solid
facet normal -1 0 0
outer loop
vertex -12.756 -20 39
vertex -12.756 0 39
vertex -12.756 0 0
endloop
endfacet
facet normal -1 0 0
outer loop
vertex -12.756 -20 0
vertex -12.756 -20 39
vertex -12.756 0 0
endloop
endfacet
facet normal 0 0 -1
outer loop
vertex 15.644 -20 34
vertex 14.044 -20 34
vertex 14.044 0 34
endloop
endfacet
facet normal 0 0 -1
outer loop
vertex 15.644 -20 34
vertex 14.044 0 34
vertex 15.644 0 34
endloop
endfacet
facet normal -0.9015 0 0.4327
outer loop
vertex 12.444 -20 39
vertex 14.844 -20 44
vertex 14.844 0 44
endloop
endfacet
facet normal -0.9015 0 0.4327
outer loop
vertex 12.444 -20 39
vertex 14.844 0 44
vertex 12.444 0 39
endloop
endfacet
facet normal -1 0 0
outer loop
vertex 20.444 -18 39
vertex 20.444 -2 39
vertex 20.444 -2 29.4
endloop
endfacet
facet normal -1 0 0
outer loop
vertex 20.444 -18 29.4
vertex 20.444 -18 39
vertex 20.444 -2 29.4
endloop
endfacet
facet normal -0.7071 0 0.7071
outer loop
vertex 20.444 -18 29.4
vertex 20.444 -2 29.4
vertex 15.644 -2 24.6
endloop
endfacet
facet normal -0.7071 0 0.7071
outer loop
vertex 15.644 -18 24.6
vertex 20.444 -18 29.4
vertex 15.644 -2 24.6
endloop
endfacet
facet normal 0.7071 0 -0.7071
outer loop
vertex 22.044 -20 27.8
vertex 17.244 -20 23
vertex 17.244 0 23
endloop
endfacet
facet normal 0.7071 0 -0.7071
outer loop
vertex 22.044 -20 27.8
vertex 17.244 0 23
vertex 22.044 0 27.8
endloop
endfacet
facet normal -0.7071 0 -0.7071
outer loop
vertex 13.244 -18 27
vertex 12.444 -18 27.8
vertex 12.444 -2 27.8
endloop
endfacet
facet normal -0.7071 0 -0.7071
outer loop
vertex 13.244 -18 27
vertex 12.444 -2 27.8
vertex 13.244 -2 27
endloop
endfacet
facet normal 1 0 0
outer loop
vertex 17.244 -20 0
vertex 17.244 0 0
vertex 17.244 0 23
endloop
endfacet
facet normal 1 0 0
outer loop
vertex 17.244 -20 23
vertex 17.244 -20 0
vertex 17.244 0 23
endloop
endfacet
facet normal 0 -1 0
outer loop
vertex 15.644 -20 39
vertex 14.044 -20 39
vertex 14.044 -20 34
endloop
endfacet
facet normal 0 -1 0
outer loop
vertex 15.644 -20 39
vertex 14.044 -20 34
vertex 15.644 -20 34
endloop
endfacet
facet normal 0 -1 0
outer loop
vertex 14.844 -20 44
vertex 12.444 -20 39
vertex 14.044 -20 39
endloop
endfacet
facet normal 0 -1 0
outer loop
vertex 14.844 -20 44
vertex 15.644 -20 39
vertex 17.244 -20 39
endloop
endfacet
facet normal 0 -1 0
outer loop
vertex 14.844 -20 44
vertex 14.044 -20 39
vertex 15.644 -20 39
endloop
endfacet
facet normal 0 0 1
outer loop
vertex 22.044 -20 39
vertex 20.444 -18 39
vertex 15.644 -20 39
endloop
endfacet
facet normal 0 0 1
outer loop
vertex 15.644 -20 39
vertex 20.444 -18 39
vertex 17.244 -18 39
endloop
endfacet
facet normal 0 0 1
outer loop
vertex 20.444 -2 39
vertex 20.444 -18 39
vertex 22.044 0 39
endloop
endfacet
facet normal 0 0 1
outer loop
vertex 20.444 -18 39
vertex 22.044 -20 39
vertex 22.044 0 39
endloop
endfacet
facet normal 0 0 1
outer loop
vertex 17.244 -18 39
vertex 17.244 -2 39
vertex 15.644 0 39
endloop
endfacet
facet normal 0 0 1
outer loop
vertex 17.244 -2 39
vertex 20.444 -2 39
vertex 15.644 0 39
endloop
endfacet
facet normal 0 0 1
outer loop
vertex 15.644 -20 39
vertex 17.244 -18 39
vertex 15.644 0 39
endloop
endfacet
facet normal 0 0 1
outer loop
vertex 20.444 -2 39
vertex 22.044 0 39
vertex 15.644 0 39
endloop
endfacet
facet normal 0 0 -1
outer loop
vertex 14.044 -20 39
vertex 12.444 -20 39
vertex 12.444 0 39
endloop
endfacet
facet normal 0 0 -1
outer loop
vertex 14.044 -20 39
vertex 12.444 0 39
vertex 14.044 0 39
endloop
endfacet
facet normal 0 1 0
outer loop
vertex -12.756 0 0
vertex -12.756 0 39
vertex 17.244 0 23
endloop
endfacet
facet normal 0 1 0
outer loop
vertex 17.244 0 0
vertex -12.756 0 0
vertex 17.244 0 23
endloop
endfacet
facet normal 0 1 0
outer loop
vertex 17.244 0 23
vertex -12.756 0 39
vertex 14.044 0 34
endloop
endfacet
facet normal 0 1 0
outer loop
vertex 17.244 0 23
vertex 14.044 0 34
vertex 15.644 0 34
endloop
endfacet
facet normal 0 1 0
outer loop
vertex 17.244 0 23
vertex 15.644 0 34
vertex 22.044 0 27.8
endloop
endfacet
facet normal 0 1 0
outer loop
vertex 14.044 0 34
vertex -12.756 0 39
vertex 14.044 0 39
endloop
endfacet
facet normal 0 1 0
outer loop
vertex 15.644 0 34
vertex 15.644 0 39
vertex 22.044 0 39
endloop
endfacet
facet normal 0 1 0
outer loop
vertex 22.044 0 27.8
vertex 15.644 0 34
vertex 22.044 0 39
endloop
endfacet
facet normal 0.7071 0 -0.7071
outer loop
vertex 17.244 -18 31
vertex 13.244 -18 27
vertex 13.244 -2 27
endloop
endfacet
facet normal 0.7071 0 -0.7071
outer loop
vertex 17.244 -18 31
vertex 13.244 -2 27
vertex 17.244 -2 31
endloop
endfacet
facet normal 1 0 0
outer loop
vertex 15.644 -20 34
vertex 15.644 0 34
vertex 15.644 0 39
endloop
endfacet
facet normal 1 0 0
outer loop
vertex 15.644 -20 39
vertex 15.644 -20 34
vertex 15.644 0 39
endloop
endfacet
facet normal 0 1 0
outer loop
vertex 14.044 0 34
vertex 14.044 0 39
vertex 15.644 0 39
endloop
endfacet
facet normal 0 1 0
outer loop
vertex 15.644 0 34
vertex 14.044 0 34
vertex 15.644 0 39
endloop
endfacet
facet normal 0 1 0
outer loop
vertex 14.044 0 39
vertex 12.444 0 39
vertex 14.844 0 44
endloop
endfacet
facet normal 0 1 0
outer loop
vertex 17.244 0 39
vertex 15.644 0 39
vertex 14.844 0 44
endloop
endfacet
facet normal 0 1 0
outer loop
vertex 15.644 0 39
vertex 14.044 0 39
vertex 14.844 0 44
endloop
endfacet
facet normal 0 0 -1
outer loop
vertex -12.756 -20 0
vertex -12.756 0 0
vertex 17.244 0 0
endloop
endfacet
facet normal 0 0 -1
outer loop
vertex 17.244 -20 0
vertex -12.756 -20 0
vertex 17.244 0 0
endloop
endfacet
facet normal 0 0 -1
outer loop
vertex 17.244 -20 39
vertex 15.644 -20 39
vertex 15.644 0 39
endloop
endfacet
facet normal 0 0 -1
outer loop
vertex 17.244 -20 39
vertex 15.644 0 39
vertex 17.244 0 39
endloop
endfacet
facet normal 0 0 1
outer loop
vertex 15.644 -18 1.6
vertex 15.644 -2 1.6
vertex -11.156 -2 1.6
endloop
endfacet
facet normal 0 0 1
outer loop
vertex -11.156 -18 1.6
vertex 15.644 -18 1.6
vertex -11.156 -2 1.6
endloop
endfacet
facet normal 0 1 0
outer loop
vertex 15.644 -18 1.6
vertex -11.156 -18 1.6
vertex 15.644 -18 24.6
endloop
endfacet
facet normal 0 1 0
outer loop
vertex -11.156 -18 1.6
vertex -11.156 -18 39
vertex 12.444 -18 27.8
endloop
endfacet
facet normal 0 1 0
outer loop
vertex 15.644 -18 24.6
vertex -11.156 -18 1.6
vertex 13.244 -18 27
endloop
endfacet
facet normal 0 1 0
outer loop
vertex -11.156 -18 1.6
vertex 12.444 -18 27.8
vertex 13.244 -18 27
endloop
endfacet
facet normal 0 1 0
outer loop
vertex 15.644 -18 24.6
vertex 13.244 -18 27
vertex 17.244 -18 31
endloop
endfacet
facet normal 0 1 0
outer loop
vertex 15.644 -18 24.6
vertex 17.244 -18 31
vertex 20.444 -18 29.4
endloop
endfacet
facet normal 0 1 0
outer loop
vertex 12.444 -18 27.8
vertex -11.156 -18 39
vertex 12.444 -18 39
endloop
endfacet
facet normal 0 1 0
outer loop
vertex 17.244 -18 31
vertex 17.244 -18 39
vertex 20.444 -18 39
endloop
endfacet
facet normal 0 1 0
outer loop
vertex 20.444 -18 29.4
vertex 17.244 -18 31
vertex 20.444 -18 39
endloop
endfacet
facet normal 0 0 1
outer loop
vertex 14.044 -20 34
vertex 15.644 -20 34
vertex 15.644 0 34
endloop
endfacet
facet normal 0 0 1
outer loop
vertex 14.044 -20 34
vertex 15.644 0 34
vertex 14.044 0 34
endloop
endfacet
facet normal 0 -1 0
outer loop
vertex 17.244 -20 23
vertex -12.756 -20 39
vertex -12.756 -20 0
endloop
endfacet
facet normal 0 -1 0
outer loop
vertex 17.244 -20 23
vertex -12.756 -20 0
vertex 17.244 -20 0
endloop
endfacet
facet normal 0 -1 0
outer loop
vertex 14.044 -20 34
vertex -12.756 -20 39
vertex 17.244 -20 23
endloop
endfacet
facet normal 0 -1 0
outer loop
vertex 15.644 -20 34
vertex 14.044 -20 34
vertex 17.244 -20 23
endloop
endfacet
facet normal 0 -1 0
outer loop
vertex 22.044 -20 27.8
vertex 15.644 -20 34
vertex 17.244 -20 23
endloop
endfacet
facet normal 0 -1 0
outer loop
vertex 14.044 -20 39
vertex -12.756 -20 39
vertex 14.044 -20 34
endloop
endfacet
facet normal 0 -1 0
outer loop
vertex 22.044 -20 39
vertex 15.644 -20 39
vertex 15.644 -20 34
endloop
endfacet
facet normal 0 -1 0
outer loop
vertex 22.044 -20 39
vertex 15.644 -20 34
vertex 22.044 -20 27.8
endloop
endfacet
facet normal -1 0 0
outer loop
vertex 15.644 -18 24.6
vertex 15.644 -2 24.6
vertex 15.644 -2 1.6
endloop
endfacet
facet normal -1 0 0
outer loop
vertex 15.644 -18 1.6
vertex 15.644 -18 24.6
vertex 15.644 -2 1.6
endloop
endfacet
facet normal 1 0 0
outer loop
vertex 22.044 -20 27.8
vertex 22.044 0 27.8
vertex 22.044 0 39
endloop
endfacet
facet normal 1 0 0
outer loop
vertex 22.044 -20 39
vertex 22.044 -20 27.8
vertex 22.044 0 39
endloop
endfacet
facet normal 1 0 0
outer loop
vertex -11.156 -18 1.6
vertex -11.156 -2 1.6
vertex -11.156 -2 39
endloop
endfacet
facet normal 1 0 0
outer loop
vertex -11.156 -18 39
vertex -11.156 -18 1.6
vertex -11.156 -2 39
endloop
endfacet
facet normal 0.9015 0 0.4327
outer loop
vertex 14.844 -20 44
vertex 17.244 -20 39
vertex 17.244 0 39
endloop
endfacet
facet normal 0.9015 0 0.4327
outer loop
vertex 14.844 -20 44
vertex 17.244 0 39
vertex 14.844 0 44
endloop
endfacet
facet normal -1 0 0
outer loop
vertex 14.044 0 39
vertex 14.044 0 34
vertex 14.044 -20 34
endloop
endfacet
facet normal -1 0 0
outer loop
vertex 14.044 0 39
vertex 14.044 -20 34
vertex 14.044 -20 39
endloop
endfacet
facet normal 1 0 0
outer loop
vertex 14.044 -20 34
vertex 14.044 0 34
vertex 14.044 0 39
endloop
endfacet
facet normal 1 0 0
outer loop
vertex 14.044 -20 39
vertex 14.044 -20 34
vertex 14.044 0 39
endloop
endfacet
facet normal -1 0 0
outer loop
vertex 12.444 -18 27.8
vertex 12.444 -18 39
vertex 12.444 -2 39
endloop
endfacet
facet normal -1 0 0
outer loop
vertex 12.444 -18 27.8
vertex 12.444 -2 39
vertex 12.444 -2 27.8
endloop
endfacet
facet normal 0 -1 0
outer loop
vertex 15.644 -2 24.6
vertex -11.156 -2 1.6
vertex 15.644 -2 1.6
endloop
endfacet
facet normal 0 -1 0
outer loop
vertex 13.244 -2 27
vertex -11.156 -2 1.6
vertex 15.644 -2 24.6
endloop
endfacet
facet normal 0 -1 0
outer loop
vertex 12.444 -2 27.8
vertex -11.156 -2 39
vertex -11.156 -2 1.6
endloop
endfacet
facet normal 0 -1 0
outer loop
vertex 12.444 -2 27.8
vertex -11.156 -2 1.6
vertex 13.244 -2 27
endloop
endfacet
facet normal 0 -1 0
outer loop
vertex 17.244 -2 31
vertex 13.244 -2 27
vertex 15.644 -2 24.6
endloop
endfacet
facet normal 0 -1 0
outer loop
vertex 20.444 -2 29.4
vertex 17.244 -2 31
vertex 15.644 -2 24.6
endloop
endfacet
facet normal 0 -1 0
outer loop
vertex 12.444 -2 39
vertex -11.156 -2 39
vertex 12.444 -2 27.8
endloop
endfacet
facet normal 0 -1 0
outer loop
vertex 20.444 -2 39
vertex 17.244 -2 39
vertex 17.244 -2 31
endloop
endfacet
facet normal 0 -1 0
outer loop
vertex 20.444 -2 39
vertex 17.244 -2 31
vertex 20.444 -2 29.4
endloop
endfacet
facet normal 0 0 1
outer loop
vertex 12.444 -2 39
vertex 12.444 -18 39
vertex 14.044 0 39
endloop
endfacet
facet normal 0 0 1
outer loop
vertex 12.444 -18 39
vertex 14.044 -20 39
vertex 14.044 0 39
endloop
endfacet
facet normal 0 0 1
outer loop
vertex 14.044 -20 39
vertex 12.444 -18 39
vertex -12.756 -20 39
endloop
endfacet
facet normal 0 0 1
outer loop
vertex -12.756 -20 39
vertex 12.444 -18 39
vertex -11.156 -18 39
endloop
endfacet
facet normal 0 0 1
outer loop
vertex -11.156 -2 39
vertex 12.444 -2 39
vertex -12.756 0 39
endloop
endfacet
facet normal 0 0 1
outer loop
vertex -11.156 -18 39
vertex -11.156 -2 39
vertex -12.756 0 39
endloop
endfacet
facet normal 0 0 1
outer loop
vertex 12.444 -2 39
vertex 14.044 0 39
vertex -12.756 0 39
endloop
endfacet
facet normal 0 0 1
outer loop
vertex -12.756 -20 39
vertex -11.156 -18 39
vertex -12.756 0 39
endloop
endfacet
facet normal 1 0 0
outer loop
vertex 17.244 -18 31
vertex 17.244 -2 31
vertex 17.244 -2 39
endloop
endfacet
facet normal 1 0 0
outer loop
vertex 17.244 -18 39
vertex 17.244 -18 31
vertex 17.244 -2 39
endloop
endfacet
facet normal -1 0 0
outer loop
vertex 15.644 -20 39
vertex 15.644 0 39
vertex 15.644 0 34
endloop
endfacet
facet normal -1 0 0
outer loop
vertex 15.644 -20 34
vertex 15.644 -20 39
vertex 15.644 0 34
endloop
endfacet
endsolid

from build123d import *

# Parameters (mm, degrees)
F0_W     = 1.6
F0_H     = 37.4
F1_DEPTH = 20
F2_DEPTH = 2
F3_START = 18
F3_DEPTH = 2
F0_H_2   = 5
F4_DEPTH = 20


with BuildPart() as f1:
    # F0 (on Front) → F1 (new body)
    with BuildSketch(Plane.XZ):
        with Locations((-11.9564137042, 20.3)):
            Rectangle(F0_W, F0_H)
        Polygon((-11.1564137042, 1.6), (-12.7564137042, 1.6), (-12.7564137042, 0), (17.2435862958, 0), (17.2435862958, 1.6), (15.6435862958, 1.6), (14.0435862958, 1.6), align=None)
        Polygon((15.6435862958, 24.6), (15.6435862958, 1.6), (17.2435862958, 1.6), (17.2435862958, 23), align=None)
        Polygon((17.2435862958, 26.2), (15.6435862958, 24.6), (17.2435862958, 23), align=None)
        Polygon((17.2435862958, 26.2), (17.2435862958, 23), (22.0435862958, 27.8), (22.0435862958, 39), (20.4435862958, 39), (20.4435862958, 29.4), align=None)
    extrude(amount=F1_DEPTH)



with BuildPart() as f1b:
    # F0 (on Front) → F1, piece 2 (new body)
    with BuildSketch(Plane.XZ):
        Polygon((14.0435862958, 39), (12.4435862958, 39), (12.4435862958, 27.8), (13.2435862958, 27), (17.2435862958, 31), (17.2435862958, 39), (15.6435862958, 39), (15.6435862958, 34), (14.0435862958, 34), align=None)
    extrude(amount=F1_DEPTH)


with BuildPart() as f1_1:
    add(f1.part)

    add(f1b.part)  # F2 merges F1b
    # F0 (on Front) → F2 (join)
    with BuildSketch(Plane.XZ):
        Polygon((-11.1564137042, 39), (-11.1564137042, 1.6), (14.0435862958, 1.6), (15.6435862958, 1.6), (15.6435862958, 24.6), (13.2435862958, 27), (12.4435862958, 27.8), (12.4435862958, 39), align=None)
        Polygon((15.6435862958, 24.6), (15.6435862958, 1.6), (17.2435862958, 1.6), (17.2435862958, 23), align=None)
        Polygon((14.0435862958, 39), (12.4435862958, 39), (12.4435862958, 27.8), (13.2435862958, 27), (17.2435862958, 31), (17.2435862958, 39), (15.6435862958, 39), (15.6435862958, 34), (14.0435862958, 34), align=None)
        Polygon((13.2435862958, 27), (15.6435862958, 24.6), (17.2435862958, 26.2), (17.2435862958, 31), align=None)
        Polygon((17.2435862958, 31), (17.2435862958, 26.2), (20.4435862958, 29.4), (20.4435862958, 39), (17.2435862958, 39), align=None)
    extrude(amount=F2_DEPTH)

    # F0 (on Front) → F3 (join)
    with BuildSketch(Plane.XZ.offset(F3_START)):
        Polygon((13.2435862958, 27), (15.6435862958, 24.6), (17.2435862958, 26.2), (17.2435862958, 31), align=None)
        Polygon((17.2435862958, 26.2), (17.2435862958, 23), (22.0435862958, 27.8), (22.0435862958, 39), (20.4435862958, 39), (20.4435862958, 29.4), align=None)
        Polygon((17.2435862958, 31), (17.2435862958, 26.2), (20.4435862958, 29.4), (20.4435862958, 39), (17.2435862958, 39), align=None)
        Polygon((17.2435862958, 26.2), (15.6435862958, 24.6), (17.2435862958, 23), align=None)
        Polygon((15.6435862958, 24.6), (15.6435862958, 1.6), (17.2435862958, 1.6), (17.2435862958, 23), align=None)
        Polygon((-11.1564137042, 39), (-11.1564137042, 1.6), (14.0435862958, 1.6), (15.6435862958, 1.6), (15.6435862958, 24.6), (13.2435862958, 27), (12.4435862958, 27.8), (12.4435862958, 39), align=None)
        Polygon((-11.1564137042, 1.6), (-12.7564137042, 1.6), (-12.7564137042, 0), (17.2435862958, 0), (17.2435862958, 1.6), (15.6435862958, 1.6), (14.0435862958, 1.6), align=None)
        with Locations((-11.9564137042, 20.3)):
            Rectangle(F0_W, F0_H)
        Polygon((14.0435862958, 39), (12.4435862958, 39), (12.4435862958, 27.8), (13.2435862958, 27), (17.2435862958, 31), (17.2435862958, 39), (15.6435862958, 39), (15.6435862958, 34), (14.0435862958, 34), align=None)
    extrude(amount=F3_DEPTH)


with BuildPart() as f4:
    # F0 (on Front) → F4 (new body)
    with BuildSketch(Plane.XZ):
        Polygon((14.8435862958, 44), (12.4435862958, 39), (14.0435862958, 39), (15.6435862958, 39), (17.2435862958, 39), align=None)
        with Locations((14.8435862958, 36.5)):
            Rectangle(F0_W, F0_H_2)
    extrude(amount=F4_DEPTH)


solid = Compound([f1_1.part, f4.part])
